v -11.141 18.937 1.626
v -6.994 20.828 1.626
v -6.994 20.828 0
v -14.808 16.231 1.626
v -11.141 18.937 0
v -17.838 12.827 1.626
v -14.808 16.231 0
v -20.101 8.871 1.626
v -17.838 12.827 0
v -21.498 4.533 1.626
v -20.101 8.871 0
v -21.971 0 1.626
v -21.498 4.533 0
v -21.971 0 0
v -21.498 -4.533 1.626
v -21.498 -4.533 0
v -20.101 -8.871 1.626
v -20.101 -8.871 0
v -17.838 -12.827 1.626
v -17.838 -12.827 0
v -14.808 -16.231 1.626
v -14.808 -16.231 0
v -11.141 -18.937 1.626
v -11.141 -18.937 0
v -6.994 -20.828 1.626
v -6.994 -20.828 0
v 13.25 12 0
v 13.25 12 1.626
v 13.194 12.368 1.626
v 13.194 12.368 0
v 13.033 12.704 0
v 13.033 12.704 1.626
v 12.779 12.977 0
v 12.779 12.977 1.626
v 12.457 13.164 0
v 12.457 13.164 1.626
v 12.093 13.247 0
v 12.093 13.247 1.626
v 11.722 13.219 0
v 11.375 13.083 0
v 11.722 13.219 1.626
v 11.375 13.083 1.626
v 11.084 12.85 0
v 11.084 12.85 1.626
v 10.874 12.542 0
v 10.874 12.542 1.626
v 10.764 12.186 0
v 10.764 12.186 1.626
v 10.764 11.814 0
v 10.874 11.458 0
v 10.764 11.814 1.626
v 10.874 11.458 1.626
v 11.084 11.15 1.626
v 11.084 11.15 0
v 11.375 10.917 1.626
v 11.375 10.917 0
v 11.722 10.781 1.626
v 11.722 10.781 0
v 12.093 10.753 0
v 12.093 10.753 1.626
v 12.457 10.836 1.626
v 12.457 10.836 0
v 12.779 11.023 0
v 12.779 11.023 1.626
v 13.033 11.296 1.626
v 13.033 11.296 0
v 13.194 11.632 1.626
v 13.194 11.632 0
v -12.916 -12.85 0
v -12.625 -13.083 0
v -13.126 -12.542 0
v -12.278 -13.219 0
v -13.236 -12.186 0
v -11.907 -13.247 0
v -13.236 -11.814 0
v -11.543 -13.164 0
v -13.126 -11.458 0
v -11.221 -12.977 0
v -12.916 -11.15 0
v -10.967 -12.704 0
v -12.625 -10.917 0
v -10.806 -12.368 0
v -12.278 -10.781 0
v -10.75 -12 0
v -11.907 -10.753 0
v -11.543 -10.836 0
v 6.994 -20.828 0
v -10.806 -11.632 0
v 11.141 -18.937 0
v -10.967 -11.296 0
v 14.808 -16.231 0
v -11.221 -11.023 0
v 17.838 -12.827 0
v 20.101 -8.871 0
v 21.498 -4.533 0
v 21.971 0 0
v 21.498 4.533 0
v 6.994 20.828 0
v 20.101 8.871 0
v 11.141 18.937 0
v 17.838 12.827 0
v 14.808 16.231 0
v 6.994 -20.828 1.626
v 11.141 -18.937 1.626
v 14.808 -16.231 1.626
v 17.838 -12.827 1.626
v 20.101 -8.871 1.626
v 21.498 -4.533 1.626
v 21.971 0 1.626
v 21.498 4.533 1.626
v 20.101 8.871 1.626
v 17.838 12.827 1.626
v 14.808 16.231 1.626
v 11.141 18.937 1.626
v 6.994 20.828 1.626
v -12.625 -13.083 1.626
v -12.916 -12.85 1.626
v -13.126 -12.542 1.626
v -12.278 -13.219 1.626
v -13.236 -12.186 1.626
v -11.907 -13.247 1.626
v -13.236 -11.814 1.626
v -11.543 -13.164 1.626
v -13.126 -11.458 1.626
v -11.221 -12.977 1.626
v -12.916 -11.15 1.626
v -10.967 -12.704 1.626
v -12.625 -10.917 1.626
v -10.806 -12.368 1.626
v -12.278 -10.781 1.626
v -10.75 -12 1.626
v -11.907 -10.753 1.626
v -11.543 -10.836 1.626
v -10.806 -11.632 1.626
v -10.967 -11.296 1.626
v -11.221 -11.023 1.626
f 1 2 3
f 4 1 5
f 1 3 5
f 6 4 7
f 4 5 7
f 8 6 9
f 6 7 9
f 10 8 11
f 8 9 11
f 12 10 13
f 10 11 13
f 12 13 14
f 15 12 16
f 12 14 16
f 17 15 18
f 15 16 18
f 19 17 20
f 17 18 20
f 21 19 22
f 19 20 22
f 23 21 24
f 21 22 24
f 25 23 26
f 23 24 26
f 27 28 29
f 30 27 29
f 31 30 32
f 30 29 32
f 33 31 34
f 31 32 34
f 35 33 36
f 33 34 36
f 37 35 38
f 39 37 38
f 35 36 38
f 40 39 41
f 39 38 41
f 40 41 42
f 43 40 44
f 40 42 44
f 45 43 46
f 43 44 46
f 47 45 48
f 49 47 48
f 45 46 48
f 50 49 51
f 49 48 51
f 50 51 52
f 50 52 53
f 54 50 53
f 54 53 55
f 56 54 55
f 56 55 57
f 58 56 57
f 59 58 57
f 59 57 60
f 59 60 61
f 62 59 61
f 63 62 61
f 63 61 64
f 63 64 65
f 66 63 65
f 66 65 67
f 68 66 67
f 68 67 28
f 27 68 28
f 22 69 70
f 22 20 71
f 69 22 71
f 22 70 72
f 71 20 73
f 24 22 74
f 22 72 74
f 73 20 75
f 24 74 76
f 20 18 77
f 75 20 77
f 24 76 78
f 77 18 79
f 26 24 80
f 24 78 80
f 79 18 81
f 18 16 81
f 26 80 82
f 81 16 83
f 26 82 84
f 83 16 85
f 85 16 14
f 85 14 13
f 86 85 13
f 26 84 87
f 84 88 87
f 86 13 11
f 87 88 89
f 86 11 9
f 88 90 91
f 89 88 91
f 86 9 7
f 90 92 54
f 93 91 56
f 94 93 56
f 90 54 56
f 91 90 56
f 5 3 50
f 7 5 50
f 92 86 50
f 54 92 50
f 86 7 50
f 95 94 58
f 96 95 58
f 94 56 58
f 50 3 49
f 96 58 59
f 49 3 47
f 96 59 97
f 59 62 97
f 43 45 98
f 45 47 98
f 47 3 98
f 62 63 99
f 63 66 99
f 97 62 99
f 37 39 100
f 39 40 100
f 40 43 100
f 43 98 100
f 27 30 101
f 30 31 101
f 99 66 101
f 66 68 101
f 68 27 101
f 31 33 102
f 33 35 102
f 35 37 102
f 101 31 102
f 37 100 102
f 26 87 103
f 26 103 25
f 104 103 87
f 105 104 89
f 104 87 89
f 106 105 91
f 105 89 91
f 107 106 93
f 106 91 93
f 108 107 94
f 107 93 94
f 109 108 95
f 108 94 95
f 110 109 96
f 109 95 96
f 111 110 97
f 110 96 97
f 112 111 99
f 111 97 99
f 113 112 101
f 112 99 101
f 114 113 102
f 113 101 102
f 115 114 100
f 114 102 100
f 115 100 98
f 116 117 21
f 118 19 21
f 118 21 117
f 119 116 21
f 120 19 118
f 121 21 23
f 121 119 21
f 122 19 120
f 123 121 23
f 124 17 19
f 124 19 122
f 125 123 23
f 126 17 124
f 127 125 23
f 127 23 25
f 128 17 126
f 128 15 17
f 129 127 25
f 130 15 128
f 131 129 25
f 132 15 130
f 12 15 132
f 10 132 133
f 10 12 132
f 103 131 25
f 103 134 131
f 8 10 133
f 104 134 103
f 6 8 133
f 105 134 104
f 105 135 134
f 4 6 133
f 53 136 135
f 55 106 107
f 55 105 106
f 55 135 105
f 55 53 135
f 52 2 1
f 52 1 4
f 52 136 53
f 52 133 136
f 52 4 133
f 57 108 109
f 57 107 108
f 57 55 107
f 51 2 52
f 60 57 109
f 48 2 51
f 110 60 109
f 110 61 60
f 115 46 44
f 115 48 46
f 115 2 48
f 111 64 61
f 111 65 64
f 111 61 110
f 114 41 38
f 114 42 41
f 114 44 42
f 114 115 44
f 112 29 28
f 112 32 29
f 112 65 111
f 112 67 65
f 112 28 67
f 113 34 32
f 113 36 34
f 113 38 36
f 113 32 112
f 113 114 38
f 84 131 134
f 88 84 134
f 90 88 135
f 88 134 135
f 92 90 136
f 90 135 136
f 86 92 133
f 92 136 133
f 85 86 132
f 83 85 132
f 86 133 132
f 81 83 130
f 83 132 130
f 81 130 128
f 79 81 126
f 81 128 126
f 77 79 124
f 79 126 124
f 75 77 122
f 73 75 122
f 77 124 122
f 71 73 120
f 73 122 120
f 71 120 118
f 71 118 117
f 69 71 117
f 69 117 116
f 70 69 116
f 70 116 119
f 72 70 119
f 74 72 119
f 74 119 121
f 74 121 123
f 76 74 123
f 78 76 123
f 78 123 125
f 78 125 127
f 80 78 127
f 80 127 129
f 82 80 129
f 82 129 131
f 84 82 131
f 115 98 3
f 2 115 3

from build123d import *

# Parameters (mm, degrees)
SKETCH1_R           = 21.971
BOSS_EXTRUDE1_DEPTH = 1.6256
SKETCH2_R           = 1.25
CUT_EXTRUDE1_DEPTH  = 32.114180969
SKETCH3_W           = 13.98846053
SKETCH3_H           = 5.196987607
CUT_EXTRUDE2_DEPTH  = 32.114180969


with BuildPart() as part:
    # Sketch1 → Boss-Extrude1 (new body)
    with BuildSketch(Plane.XY):
        Circle(SKETCH1_R)
    extrude(amount=BOSS_EXTRUDE1_DEPTH)

    # Sketch2 → Cut-Extrude1 (cut, through all)
    with BuildSketch(Plane.XY.offset(1.6256)):
        with Locations((12, 12)):
            Circle(SKETCH2_R)
        with Locations((-12, -12)):
            Circle(SKETCH2_R)
    extrude(amount=-CUT_EXTRUDE1_DEPTH, mode=Mode.SUBTRACT)

    # Sketch3 → Cut-Extrude2 (cut, through all)
    with BuildSketch(Plane(origin=(0, 0, 0), x_dir=(-1, 0, 0), z_dir=(0, 0, -1))):
        with Locations((0, 23.426493804)):
            Rectangle(SKETCH3_W, SKETCH3_H)
        with Locations((0, -23.426493804)):
            Rectangle(SKETCH3_W, SKETCH3_H)
    extrude(amount=-CUT_EXTRUDE2_DEPTH, mode=Mode.SUBTRACT)


solid = part.part
